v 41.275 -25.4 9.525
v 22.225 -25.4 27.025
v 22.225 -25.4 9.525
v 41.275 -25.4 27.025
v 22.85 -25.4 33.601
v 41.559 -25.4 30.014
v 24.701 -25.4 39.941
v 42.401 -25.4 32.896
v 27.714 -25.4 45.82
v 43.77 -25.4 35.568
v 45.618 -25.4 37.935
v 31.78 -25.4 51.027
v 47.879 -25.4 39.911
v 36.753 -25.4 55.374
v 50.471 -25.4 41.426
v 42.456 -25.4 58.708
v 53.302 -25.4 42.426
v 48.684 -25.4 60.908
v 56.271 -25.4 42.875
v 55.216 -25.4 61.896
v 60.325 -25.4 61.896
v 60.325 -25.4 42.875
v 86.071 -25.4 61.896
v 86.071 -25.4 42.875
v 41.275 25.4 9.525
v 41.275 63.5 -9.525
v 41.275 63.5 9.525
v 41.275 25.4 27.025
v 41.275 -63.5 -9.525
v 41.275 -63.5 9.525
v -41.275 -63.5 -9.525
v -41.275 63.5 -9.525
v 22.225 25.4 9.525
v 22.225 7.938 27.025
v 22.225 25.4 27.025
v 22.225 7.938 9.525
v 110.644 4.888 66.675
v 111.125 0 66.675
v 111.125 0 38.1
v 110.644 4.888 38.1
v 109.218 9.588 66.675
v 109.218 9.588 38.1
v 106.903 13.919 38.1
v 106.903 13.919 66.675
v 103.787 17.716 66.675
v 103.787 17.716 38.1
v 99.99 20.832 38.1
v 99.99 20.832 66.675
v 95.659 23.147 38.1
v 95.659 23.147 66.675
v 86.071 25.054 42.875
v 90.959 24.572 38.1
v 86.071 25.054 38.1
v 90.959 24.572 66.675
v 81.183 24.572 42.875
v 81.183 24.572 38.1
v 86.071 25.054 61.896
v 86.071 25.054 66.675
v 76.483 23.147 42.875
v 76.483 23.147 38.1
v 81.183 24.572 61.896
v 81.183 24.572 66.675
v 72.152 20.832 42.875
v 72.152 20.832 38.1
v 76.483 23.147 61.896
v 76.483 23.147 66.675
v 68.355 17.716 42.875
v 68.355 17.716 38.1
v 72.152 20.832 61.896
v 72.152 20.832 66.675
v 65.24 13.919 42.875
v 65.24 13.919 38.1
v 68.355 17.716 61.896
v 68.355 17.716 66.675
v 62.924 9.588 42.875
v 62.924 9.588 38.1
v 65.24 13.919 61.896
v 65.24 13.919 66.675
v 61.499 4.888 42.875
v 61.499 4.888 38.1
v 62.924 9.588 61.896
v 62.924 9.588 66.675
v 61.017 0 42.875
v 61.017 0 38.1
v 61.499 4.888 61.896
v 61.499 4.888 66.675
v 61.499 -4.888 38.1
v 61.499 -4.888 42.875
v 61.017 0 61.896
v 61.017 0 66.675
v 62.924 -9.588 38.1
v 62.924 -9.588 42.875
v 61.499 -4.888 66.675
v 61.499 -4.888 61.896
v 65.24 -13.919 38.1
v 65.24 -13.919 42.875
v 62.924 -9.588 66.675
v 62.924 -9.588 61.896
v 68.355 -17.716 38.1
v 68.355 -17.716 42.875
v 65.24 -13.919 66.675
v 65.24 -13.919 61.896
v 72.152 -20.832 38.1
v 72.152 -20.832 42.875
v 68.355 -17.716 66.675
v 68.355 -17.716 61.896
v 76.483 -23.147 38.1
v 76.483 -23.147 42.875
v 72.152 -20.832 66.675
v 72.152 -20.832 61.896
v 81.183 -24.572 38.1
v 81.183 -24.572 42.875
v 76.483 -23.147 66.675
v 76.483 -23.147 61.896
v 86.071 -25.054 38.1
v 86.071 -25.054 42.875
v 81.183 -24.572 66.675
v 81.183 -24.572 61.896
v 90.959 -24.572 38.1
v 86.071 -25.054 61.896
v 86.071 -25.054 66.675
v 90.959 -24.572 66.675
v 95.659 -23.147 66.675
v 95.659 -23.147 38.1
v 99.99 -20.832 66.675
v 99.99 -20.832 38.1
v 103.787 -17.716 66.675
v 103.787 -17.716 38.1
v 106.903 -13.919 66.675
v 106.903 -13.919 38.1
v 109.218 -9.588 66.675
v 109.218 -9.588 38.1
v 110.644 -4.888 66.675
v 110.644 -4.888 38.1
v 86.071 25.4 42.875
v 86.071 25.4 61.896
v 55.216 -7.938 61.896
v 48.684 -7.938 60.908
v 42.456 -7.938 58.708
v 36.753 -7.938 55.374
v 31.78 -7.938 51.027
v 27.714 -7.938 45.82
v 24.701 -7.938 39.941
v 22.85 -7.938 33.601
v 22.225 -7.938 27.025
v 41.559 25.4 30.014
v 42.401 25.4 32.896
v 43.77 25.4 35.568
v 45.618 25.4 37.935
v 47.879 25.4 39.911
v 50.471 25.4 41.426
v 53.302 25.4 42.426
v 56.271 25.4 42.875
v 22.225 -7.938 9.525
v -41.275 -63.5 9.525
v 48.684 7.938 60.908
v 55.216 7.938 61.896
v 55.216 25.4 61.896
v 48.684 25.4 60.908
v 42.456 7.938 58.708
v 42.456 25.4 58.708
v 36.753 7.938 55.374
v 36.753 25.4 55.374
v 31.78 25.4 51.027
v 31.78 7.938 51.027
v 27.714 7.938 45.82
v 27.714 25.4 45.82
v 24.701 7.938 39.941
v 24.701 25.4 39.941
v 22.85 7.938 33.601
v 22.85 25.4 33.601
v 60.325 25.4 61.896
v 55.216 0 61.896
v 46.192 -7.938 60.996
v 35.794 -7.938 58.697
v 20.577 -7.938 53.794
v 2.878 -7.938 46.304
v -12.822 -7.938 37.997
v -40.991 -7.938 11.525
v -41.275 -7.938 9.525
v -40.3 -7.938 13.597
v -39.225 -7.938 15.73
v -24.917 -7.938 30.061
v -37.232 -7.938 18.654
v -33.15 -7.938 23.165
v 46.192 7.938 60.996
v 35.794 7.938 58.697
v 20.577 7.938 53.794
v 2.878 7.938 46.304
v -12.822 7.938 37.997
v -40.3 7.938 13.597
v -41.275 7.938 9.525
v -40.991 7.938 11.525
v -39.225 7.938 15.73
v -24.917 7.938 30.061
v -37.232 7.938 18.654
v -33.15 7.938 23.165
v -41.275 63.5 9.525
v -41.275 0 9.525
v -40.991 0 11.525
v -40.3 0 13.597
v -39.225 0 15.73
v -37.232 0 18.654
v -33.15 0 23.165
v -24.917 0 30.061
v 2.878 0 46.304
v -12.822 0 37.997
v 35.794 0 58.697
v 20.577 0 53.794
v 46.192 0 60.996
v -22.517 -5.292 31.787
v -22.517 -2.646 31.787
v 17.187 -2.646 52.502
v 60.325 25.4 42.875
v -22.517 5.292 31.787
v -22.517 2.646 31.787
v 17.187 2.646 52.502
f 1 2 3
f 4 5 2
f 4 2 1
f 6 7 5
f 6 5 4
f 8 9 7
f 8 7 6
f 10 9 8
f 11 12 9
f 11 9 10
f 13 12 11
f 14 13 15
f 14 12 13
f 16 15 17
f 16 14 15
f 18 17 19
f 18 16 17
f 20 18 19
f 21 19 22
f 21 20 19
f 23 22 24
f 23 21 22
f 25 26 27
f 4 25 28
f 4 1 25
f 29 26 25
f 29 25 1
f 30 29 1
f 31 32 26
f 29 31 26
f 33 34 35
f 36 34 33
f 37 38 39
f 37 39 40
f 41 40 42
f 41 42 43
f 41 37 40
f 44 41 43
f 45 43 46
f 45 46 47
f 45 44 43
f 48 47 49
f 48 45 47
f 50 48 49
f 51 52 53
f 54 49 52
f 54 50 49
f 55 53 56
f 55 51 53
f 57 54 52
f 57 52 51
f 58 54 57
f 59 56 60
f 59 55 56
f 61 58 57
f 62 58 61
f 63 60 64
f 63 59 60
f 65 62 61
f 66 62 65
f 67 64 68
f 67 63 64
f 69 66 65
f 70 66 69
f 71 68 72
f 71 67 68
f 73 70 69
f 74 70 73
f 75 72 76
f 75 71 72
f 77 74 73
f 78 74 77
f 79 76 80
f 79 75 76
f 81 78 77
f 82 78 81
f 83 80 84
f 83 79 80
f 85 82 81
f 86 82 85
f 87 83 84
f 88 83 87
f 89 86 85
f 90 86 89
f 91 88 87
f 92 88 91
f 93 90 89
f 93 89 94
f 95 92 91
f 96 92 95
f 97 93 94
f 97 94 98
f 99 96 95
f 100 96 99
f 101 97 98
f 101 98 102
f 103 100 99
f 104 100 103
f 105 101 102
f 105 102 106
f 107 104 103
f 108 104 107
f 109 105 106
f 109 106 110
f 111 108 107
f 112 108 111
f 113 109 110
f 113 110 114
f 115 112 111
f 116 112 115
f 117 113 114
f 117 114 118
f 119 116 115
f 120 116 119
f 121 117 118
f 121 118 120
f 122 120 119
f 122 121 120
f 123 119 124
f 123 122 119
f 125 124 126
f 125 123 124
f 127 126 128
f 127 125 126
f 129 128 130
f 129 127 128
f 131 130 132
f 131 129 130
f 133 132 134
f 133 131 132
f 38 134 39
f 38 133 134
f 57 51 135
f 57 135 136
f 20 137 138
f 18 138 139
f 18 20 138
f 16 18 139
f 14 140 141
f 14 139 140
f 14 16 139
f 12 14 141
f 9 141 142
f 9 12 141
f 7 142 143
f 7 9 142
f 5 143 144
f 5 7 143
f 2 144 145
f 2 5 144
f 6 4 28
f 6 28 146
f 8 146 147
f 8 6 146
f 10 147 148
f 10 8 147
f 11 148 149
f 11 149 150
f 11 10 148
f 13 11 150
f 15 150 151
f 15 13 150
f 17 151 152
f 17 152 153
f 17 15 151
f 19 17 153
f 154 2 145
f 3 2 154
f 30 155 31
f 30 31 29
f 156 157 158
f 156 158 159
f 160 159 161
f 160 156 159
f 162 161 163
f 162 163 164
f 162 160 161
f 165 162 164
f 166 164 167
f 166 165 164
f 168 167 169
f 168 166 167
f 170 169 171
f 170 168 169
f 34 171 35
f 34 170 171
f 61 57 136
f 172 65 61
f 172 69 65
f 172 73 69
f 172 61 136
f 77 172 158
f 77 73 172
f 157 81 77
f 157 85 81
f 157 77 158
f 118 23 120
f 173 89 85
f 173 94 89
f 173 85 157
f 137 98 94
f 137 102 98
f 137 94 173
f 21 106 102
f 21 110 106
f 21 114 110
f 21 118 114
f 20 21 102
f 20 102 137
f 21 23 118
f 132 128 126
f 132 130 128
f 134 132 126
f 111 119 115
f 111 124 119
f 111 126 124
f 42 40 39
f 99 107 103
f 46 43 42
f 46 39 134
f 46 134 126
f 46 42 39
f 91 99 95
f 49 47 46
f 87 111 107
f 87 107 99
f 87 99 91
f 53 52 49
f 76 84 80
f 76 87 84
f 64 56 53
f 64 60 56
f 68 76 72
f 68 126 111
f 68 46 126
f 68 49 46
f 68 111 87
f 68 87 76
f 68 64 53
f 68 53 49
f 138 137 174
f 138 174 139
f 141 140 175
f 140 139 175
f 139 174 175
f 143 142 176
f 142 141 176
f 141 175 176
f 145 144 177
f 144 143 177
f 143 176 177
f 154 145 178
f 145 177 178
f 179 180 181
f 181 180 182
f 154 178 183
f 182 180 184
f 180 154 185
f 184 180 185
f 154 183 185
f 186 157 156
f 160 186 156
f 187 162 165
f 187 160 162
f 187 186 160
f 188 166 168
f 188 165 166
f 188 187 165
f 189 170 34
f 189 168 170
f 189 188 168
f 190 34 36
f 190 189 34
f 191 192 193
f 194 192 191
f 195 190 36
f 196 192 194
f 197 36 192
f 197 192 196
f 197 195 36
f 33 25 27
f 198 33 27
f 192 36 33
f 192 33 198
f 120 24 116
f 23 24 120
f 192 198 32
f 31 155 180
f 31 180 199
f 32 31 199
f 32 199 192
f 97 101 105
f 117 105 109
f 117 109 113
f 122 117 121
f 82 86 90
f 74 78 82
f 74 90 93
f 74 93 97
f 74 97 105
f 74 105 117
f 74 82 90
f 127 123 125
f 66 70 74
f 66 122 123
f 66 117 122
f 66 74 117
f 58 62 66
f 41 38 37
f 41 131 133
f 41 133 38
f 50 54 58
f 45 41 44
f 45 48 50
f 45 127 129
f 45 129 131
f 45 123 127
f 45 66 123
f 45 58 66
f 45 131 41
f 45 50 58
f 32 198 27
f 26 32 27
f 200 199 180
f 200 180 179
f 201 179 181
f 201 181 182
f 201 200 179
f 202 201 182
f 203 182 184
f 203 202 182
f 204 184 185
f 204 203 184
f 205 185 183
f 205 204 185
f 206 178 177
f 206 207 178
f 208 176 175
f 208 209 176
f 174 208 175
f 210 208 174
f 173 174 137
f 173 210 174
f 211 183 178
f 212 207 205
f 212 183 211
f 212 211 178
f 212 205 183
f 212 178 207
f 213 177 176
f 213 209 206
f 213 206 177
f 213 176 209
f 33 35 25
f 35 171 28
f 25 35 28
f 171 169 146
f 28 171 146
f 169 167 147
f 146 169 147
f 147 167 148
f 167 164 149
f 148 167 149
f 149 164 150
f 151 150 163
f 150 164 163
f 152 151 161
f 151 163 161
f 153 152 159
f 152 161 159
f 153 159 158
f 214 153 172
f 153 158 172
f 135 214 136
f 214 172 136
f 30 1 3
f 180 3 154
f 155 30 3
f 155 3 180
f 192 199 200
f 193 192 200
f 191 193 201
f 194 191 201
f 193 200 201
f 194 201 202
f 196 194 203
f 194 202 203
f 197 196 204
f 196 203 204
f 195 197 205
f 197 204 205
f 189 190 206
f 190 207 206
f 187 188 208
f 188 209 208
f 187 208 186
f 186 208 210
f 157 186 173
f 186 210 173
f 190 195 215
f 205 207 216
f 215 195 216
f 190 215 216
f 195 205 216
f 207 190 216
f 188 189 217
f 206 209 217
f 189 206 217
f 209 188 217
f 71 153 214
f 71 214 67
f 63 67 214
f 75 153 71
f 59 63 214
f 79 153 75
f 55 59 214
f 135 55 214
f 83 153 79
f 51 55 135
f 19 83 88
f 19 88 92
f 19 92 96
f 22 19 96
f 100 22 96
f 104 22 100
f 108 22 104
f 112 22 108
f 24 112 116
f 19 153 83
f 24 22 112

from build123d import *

# Parameters (mm, degrees)
F1_DEPTH = 63.5
F0_W     = 25.7461559653
F0_H     = 19.0207560397
F2_DEPTH = 25.4
F3_DEPTH = 7.9375


# Not quite as in the source:
# - a feature names something its author has since deleted; it is built from what else it names


with BuildPart() as f1:
    # F0 (on Front) → F1 (new body, symmetric)
    with BuildSketch(Plane.XZ):
        Polygon((22.225, 9.525), (-41.275, 9.525), (-41.275, -9.525), (41.275, -9.525), (41.275, 9.525), align=None)
    extrude(amount=F1_DEPTH, both=True)

    # F0 (on Front) → F2 (join, symmetric)
    with BuildSketch(Plane.XZ):
        with BuildLine():
            Line((22.225, 27.0245699669), (22.225, 9.525))
            Line((22.225, 9.525), (41.275, 9.525))
            Line((41.275, 9.525), (41.275, 27.0245699669))
            ThreePointArc((41.275, 27.0245699669), (45.6179930488, 37.9345855799), (56.2707090616, 42.8752))
            Line((56.2707090616, 42.8752), (60.325, 42.8752))
            Line((60.325, 42.8752), (60.325, 61.8959560397))
            Line((60.325, 61.8959560397), (55.2155599356, 61.8959560397))
            ThreePointArc((55.2155599356, 61.8959560397), (31.7795847073, 51.0266043156), (22.225, 27.0245699669))
        make_face()
        with Locations((73.1980779827, 52.3855780199)):
            Rectangle(F0_W, F0_H)
    extrude(amount=F2_DEPTH, both=True)

    # F0 (on Front) → F3 (join, symmetric)
    with BuildSketch(Plane.XZ):
        with BuildLine():
            add(Edge.make_bspline(
                [(-41.275, 9.525), (-40.530513972, 29.3039940298), (25.5654975772, 61.4196136594), (55.2155599356, 61.8959560397)],
                knots=[0, 0, 0, 0, 109.7868170282, 109.7868170282, 109.7868170282, 109.7868170282], degree=3))
            Line((-41.275, 9.525), (22.225, 9.525))
            Line((22.225, 9.525), (22.225, 27.0245699669))
            ThreePointArc((22.225, 27.0245699669), (31.7795847073, 51.0266043156), (55.2155599356, 61.8959560397))
        make_face()
    extrude(amount=F3_DEPTH, both=True)

    # F0 (on Front) → F4 (revolve)
    with BuildSketch(Plane.XZ):
        Polygon((86.0711559653, 66.675), (86.0711559653, 61.8959560397), (86.0711559653, 42.8752), (86.0711559653, 38.1), (111.125, 38.1), (111.125, 66.675), align=None)
    revolve(axis=Axis((86.0711559653, 0, 52.3875), (0, 0, 1)))


solid = f1.part
